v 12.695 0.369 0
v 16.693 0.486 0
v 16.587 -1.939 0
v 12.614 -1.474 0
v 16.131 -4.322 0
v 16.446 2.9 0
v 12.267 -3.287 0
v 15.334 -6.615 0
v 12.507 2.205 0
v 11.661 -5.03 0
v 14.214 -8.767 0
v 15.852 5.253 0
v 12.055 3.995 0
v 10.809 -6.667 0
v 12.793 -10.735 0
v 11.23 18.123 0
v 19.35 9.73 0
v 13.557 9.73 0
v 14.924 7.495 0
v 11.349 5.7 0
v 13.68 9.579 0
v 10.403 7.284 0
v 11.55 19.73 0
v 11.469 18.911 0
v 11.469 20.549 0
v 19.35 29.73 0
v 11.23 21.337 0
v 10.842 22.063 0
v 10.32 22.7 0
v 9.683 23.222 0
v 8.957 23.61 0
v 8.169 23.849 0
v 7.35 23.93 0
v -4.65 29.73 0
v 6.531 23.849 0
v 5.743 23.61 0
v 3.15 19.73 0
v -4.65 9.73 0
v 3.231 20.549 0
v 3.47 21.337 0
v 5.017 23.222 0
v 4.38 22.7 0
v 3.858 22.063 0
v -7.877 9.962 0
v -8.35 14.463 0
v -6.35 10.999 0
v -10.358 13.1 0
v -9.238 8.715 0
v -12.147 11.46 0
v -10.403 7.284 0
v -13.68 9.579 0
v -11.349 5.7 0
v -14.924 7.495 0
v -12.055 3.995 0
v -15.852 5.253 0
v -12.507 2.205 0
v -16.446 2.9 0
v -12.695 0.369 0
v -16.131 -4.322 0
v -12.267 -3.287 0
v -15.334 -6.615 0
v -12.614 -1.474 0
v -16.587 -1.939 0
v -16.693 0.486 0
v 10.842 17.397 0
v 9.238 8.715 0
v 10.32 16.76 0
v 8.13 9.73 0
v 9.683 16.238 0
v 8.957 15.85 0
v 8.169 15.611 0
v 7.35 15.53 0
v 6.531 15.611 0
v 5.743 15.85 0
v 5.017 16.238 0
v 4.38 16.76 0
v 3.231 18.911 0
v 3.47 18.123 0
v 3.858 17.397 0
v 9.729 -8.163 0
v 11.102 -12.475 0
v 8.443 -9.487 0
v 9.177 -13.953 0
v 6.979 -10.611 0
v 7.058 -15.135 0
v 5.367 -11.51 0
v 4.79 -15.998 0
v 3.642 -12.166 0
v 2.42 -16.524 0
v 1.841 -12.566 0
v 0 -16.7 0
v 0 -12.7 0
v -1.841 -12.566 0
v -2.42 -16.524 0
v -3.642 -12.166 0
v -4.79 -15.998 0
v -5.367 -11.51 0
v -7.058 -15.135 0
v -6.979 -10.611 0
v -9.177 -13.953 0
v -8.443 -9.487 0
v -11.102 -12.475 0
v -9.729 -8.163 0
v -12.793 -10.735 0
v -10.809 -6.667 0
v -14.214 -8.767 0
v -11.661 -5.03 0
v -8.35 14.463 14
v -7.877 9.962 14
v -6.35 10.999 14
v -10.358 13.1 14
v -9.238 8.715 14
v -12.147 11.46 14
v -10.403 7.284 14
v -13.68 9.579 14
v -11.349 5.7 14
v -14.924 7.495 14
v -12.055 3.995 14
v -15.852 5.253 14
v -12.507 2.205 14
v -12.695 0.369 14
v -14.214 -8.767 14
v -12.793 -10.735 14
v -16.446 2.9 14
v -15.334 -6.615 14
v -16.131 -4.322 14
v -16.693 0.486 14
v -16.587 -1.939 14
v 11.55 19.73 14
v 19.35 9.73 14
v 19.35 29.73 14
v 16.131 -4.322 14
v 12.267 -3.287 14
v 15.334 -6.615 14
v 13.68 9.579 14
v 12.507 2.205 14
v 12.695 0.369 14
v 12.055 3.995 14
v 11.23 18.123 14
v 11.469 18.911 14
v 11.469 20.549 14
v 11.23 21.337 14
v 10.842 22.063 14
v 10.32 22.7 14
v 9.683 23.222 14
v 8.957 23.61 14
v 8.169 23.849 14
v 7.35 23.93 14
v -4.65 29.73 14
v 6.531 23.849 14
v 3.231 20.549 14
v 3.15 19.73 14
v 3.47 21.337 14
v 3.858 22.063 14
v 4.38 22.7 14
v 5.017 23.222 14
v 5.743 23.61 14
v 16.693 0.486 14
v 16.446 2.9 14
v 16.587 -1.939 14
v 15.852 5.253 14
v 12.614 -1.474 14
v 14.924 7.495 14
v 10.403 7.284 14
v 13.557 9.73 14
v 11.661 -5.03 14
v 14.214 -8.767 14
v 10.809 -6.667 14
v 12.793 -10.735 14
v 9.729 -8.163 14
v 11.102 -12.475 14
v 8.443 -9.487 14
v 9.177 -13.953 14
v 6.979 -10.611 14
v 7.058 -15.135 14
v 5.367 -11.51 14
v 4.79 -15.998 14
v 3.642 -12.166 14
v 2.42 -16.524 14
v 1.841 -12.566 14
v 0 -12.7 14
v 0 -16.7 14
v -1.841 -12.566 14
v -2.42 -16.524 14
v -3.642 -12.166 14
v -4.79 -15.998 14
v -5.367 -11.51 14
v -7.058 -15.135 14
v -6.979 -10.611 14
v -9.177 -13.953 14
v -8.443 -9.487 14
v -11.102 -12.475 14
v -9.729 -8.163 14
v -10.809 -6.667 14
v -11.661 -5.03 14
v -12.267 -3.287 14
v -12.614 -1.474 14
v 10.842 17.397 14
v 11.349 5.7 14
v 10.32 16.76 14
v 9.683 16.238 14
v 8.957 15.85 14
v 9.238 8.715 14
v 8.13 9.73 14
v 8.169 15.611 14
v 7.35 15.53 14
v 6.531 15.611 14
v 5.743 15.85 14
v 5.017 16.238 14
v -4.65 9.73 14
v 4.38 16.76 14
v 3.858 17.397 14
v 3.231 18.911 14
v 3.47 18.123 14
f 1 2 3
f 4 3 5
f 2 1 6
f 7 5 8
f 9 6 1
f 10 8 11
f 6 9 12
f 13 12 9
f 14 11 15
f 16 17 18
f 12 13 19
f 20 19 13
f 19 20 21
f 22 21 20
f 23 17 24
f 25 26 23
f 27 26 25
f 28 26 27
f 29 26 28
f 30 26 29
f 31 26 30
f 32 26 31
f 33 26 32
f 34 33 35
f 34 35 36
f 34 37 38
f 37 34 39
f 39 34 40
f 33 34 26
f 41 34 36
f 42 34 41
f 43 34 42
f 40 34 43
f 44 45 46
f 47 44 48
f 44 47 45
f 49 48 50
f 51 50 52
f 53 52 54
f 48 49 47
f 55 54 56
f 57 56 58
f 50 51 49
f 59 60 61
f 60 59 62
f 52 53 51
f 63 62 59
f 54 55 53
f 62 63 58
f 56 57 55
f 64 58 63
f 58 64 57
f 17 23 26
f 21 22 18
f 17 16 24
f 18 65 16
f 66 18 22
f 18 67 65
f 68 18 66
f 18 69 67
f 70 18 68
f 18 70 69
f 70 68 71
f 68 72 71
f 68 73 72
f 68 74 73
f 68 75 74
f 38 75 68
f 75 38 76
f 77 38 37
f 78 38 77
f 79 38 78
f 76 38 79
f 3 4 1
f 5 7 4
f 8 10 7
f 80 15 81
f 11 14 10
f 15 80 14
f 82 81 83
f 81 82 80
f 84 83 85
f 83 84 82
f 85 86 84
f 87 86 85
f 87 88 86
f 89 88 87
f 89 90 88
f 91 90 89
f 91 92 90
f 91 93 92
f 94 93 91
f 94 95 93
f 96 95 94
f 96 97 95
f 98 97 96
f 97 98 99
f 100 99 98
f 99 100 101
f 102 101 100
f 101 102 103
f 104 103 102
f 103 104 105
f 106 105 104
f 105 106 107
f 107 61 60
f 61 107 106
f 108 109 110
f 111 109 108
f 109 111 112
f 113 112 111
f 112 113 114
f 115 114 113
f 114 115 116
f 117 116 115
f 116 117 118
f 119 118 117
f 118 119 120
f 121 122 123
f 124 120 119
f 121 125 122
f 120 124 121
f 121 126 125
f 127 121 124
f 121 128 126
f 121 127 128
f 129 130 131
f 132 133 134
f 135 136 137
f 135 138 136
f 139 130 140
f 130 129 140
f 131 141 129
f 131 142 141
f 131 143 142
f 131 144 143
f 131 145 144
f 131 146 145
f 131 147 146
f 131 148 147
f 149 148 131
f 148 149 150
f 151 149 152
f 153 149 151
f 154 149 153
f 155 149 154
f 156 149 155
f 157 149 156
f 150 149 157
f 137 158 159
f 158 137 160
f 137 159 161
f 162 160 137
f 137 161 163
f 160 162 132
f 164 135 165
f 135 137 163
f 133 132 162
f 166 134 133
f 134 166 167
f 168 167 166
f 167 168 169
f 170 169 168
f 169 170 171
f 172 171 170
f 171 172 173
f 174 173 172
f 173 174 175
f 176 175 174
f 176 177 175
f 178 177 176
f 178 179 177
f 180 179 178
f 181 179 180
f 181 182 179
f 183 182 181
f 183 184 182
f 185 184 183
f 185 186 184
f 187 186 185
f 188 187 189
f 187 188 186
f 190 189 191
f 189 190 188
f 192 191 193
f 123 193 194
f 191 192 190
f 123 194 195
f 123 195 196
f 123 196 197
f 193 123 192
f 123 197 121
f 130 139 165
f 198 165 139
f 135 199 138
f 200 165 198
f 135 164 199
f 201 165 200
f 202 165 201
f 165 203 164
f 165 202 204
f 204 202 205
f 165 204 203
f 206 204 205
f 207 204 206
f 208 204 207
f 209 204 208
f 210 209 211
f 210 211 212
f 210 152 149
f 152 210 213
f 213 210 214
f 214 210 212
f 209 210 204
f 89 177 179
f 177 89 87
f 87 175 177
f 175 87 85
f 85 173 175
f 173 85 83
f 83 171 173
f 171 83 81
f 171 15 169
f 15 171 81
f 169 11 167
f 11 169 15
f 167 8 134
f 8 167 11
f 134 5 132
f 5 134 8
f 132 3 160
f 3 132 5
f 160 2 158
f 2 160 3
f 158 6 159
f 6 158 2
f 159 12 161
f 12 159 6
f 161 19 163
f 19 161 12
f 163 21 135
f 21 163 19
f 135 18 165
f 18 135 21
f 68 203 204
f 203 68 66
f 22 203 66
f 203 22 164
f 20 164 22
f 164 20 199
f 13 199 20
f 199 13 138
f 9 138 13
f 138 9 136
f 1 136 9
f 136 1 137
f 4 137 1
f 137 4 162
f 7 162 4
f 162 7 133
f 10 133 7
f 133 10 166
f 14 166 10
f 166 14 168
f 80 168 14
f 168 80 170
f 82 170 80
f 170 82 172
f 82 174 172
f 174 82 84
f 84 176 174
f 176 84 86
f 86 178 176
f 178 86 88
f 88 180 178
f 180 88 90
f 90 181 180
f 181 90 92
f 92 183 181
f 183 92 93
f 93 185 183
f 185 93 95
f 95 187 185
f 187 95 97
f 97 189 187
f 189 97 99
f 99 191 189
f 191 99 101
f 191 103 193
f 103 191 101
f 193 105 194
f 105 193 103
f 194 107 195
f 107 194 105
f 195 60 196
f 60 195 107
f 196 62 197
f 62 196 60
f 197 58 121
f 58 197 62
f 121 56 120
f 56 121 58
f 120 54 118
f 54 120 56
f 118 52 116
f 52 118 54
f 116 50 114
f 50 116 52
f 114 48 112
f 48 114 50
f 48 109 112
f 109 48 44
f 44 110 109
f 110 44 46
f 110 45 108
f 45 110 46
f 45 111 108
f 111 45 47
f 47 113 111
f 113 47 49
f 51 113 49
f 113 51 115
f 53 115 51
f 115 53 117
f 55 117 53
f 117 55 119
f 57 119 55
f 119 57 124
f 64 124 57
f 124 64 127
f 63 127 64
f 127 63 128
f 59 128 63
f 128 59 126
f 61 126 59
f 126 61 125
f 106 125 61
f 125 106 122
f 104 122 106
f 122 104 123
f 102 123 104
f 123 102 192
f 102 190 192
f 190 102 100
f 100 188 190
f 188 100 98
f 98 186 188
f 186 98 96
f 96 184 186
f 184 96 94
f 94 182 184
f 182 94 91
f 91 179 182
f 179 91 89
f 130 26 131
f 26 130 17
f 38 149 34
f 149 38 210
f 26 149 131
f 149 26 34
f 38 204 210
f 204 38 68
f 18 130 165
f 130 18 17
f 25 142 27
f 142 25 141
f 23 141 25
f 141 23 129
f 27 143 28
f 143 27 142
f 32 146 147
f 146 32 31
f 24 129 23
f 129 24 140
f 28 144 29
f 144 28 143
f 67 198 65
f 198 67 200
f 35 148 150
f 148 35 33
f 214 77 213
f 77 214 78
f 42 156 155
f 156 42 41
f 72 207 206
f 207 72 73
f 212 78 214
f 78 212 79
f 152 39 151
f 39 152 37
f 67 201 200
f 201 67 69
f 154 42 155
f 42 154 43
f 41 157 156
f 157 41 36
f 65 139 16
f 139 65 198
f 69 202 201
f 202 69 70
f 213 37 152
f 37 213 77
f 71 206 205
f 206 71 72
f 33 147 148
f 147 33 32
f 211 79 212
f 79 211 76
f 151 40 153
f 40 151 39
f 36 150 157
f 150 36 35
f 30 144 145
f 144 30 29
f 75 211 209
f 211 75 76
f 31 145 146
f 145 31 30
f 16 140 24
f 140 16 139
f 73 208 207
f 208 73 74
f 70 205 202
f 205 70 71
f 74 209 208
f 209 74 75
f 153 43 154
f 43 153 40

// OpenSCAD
$fn = 32;

// ----------------------------------------------------------------------
// Pipe clamp: 33.4 mm ring, 4 mm wall, 14 mm wide
// ----------------------------------------------------------------------

// --- parameters (mm) ---
outer_r = 16.7;           // clamp outside radius
inner_r = 12.7;           // pipe bore radius
band = 4;                 // band thickness
clamp_w = 14;             // clamp width
opening = 60;             // opening angle between the ends
lug_w = 24;               // lug width
lug_len = 20;             // lug length
bolt_d = 8.4;             // bolt hole

clamp_profile = [[-8.35, 14.463], [-10.358, 13.1], [-12.147, 11.46], [-13.68, 9.579], [-14.924, 7.495], [-15.852, 5.253], [-16.446, 2.9], [-16.693, 0.486], [-16.587, -1.939], [-16.131, -4.322], [-15.334, -6.615], [-14.214, -8.767], [-12.793, -10.735], [-11.102, -12.475], [-9.177, -13.953], [-7.058, -15.135], [-4.79, -15.998], [-2.42, -16.524], [0, -16.7], [2.42, -16.524], [4.79, -15.998], [7.058, -15.135], [9.177, -13.953], [11.102, -12.475], [12.793, -10.735], [14.214, -8.767], [15.334, -6.615], [16.131, -4.322], [16.587, -1.939], [16.693, 0.486], [16.446, 2.9], [15.852, 5.253], [14.924, 7.495], [13.68, 9.579], [12.147, 11.46], [10.358, 13.1], [8.35, 14.463], [6.35, 10.999], [7.877, 9.962], [9.238, 8.715], [10.403, 7.284], [11.349, 5.7], [12.055, 3.995], [12.507, 2.205], [12.695, 0.369], [12.614, -1.474], [12.267, -3.287], [11.661, -5.03], [10.809, -6.667], [9.729, -8.163], [8.443, -9.487], [6.979, -10.611], [5.367, -11.51], [3.642, -12.166], [1.841, -12.566], [0, -12.7], [-1.841, -12.566], [-3.642, -12.166], [-5.367, -11.51], [-6.979, -10.611], [-8.443, -9.487], [-9.729, -8.163], [-10.809, -6.667], [-11.661, -5.03], [-12.267, -3.287], [-12.614, -1.474], [-12.695, 0.369], [-12.507, 2.205], [-12.055, 3.995], [-11.349, 5.7], [-10.403, 7.284], [-9.238, 8.715], [-7.877, 9.962], [-6.35, 10.999]];

difference() {
  union() {
    linear_extrude(height = clamp_w) polygon(clamp_profile);
    /* bolt lug on the other end */
    translate([-4.65, 9.73, 0]) cube([lug_w, 20, clamp_w]);
  }
  translate([7.35, 19.73, -2.5]) cylinder(h = clamp_w + 5, d = bolt_d);
}
